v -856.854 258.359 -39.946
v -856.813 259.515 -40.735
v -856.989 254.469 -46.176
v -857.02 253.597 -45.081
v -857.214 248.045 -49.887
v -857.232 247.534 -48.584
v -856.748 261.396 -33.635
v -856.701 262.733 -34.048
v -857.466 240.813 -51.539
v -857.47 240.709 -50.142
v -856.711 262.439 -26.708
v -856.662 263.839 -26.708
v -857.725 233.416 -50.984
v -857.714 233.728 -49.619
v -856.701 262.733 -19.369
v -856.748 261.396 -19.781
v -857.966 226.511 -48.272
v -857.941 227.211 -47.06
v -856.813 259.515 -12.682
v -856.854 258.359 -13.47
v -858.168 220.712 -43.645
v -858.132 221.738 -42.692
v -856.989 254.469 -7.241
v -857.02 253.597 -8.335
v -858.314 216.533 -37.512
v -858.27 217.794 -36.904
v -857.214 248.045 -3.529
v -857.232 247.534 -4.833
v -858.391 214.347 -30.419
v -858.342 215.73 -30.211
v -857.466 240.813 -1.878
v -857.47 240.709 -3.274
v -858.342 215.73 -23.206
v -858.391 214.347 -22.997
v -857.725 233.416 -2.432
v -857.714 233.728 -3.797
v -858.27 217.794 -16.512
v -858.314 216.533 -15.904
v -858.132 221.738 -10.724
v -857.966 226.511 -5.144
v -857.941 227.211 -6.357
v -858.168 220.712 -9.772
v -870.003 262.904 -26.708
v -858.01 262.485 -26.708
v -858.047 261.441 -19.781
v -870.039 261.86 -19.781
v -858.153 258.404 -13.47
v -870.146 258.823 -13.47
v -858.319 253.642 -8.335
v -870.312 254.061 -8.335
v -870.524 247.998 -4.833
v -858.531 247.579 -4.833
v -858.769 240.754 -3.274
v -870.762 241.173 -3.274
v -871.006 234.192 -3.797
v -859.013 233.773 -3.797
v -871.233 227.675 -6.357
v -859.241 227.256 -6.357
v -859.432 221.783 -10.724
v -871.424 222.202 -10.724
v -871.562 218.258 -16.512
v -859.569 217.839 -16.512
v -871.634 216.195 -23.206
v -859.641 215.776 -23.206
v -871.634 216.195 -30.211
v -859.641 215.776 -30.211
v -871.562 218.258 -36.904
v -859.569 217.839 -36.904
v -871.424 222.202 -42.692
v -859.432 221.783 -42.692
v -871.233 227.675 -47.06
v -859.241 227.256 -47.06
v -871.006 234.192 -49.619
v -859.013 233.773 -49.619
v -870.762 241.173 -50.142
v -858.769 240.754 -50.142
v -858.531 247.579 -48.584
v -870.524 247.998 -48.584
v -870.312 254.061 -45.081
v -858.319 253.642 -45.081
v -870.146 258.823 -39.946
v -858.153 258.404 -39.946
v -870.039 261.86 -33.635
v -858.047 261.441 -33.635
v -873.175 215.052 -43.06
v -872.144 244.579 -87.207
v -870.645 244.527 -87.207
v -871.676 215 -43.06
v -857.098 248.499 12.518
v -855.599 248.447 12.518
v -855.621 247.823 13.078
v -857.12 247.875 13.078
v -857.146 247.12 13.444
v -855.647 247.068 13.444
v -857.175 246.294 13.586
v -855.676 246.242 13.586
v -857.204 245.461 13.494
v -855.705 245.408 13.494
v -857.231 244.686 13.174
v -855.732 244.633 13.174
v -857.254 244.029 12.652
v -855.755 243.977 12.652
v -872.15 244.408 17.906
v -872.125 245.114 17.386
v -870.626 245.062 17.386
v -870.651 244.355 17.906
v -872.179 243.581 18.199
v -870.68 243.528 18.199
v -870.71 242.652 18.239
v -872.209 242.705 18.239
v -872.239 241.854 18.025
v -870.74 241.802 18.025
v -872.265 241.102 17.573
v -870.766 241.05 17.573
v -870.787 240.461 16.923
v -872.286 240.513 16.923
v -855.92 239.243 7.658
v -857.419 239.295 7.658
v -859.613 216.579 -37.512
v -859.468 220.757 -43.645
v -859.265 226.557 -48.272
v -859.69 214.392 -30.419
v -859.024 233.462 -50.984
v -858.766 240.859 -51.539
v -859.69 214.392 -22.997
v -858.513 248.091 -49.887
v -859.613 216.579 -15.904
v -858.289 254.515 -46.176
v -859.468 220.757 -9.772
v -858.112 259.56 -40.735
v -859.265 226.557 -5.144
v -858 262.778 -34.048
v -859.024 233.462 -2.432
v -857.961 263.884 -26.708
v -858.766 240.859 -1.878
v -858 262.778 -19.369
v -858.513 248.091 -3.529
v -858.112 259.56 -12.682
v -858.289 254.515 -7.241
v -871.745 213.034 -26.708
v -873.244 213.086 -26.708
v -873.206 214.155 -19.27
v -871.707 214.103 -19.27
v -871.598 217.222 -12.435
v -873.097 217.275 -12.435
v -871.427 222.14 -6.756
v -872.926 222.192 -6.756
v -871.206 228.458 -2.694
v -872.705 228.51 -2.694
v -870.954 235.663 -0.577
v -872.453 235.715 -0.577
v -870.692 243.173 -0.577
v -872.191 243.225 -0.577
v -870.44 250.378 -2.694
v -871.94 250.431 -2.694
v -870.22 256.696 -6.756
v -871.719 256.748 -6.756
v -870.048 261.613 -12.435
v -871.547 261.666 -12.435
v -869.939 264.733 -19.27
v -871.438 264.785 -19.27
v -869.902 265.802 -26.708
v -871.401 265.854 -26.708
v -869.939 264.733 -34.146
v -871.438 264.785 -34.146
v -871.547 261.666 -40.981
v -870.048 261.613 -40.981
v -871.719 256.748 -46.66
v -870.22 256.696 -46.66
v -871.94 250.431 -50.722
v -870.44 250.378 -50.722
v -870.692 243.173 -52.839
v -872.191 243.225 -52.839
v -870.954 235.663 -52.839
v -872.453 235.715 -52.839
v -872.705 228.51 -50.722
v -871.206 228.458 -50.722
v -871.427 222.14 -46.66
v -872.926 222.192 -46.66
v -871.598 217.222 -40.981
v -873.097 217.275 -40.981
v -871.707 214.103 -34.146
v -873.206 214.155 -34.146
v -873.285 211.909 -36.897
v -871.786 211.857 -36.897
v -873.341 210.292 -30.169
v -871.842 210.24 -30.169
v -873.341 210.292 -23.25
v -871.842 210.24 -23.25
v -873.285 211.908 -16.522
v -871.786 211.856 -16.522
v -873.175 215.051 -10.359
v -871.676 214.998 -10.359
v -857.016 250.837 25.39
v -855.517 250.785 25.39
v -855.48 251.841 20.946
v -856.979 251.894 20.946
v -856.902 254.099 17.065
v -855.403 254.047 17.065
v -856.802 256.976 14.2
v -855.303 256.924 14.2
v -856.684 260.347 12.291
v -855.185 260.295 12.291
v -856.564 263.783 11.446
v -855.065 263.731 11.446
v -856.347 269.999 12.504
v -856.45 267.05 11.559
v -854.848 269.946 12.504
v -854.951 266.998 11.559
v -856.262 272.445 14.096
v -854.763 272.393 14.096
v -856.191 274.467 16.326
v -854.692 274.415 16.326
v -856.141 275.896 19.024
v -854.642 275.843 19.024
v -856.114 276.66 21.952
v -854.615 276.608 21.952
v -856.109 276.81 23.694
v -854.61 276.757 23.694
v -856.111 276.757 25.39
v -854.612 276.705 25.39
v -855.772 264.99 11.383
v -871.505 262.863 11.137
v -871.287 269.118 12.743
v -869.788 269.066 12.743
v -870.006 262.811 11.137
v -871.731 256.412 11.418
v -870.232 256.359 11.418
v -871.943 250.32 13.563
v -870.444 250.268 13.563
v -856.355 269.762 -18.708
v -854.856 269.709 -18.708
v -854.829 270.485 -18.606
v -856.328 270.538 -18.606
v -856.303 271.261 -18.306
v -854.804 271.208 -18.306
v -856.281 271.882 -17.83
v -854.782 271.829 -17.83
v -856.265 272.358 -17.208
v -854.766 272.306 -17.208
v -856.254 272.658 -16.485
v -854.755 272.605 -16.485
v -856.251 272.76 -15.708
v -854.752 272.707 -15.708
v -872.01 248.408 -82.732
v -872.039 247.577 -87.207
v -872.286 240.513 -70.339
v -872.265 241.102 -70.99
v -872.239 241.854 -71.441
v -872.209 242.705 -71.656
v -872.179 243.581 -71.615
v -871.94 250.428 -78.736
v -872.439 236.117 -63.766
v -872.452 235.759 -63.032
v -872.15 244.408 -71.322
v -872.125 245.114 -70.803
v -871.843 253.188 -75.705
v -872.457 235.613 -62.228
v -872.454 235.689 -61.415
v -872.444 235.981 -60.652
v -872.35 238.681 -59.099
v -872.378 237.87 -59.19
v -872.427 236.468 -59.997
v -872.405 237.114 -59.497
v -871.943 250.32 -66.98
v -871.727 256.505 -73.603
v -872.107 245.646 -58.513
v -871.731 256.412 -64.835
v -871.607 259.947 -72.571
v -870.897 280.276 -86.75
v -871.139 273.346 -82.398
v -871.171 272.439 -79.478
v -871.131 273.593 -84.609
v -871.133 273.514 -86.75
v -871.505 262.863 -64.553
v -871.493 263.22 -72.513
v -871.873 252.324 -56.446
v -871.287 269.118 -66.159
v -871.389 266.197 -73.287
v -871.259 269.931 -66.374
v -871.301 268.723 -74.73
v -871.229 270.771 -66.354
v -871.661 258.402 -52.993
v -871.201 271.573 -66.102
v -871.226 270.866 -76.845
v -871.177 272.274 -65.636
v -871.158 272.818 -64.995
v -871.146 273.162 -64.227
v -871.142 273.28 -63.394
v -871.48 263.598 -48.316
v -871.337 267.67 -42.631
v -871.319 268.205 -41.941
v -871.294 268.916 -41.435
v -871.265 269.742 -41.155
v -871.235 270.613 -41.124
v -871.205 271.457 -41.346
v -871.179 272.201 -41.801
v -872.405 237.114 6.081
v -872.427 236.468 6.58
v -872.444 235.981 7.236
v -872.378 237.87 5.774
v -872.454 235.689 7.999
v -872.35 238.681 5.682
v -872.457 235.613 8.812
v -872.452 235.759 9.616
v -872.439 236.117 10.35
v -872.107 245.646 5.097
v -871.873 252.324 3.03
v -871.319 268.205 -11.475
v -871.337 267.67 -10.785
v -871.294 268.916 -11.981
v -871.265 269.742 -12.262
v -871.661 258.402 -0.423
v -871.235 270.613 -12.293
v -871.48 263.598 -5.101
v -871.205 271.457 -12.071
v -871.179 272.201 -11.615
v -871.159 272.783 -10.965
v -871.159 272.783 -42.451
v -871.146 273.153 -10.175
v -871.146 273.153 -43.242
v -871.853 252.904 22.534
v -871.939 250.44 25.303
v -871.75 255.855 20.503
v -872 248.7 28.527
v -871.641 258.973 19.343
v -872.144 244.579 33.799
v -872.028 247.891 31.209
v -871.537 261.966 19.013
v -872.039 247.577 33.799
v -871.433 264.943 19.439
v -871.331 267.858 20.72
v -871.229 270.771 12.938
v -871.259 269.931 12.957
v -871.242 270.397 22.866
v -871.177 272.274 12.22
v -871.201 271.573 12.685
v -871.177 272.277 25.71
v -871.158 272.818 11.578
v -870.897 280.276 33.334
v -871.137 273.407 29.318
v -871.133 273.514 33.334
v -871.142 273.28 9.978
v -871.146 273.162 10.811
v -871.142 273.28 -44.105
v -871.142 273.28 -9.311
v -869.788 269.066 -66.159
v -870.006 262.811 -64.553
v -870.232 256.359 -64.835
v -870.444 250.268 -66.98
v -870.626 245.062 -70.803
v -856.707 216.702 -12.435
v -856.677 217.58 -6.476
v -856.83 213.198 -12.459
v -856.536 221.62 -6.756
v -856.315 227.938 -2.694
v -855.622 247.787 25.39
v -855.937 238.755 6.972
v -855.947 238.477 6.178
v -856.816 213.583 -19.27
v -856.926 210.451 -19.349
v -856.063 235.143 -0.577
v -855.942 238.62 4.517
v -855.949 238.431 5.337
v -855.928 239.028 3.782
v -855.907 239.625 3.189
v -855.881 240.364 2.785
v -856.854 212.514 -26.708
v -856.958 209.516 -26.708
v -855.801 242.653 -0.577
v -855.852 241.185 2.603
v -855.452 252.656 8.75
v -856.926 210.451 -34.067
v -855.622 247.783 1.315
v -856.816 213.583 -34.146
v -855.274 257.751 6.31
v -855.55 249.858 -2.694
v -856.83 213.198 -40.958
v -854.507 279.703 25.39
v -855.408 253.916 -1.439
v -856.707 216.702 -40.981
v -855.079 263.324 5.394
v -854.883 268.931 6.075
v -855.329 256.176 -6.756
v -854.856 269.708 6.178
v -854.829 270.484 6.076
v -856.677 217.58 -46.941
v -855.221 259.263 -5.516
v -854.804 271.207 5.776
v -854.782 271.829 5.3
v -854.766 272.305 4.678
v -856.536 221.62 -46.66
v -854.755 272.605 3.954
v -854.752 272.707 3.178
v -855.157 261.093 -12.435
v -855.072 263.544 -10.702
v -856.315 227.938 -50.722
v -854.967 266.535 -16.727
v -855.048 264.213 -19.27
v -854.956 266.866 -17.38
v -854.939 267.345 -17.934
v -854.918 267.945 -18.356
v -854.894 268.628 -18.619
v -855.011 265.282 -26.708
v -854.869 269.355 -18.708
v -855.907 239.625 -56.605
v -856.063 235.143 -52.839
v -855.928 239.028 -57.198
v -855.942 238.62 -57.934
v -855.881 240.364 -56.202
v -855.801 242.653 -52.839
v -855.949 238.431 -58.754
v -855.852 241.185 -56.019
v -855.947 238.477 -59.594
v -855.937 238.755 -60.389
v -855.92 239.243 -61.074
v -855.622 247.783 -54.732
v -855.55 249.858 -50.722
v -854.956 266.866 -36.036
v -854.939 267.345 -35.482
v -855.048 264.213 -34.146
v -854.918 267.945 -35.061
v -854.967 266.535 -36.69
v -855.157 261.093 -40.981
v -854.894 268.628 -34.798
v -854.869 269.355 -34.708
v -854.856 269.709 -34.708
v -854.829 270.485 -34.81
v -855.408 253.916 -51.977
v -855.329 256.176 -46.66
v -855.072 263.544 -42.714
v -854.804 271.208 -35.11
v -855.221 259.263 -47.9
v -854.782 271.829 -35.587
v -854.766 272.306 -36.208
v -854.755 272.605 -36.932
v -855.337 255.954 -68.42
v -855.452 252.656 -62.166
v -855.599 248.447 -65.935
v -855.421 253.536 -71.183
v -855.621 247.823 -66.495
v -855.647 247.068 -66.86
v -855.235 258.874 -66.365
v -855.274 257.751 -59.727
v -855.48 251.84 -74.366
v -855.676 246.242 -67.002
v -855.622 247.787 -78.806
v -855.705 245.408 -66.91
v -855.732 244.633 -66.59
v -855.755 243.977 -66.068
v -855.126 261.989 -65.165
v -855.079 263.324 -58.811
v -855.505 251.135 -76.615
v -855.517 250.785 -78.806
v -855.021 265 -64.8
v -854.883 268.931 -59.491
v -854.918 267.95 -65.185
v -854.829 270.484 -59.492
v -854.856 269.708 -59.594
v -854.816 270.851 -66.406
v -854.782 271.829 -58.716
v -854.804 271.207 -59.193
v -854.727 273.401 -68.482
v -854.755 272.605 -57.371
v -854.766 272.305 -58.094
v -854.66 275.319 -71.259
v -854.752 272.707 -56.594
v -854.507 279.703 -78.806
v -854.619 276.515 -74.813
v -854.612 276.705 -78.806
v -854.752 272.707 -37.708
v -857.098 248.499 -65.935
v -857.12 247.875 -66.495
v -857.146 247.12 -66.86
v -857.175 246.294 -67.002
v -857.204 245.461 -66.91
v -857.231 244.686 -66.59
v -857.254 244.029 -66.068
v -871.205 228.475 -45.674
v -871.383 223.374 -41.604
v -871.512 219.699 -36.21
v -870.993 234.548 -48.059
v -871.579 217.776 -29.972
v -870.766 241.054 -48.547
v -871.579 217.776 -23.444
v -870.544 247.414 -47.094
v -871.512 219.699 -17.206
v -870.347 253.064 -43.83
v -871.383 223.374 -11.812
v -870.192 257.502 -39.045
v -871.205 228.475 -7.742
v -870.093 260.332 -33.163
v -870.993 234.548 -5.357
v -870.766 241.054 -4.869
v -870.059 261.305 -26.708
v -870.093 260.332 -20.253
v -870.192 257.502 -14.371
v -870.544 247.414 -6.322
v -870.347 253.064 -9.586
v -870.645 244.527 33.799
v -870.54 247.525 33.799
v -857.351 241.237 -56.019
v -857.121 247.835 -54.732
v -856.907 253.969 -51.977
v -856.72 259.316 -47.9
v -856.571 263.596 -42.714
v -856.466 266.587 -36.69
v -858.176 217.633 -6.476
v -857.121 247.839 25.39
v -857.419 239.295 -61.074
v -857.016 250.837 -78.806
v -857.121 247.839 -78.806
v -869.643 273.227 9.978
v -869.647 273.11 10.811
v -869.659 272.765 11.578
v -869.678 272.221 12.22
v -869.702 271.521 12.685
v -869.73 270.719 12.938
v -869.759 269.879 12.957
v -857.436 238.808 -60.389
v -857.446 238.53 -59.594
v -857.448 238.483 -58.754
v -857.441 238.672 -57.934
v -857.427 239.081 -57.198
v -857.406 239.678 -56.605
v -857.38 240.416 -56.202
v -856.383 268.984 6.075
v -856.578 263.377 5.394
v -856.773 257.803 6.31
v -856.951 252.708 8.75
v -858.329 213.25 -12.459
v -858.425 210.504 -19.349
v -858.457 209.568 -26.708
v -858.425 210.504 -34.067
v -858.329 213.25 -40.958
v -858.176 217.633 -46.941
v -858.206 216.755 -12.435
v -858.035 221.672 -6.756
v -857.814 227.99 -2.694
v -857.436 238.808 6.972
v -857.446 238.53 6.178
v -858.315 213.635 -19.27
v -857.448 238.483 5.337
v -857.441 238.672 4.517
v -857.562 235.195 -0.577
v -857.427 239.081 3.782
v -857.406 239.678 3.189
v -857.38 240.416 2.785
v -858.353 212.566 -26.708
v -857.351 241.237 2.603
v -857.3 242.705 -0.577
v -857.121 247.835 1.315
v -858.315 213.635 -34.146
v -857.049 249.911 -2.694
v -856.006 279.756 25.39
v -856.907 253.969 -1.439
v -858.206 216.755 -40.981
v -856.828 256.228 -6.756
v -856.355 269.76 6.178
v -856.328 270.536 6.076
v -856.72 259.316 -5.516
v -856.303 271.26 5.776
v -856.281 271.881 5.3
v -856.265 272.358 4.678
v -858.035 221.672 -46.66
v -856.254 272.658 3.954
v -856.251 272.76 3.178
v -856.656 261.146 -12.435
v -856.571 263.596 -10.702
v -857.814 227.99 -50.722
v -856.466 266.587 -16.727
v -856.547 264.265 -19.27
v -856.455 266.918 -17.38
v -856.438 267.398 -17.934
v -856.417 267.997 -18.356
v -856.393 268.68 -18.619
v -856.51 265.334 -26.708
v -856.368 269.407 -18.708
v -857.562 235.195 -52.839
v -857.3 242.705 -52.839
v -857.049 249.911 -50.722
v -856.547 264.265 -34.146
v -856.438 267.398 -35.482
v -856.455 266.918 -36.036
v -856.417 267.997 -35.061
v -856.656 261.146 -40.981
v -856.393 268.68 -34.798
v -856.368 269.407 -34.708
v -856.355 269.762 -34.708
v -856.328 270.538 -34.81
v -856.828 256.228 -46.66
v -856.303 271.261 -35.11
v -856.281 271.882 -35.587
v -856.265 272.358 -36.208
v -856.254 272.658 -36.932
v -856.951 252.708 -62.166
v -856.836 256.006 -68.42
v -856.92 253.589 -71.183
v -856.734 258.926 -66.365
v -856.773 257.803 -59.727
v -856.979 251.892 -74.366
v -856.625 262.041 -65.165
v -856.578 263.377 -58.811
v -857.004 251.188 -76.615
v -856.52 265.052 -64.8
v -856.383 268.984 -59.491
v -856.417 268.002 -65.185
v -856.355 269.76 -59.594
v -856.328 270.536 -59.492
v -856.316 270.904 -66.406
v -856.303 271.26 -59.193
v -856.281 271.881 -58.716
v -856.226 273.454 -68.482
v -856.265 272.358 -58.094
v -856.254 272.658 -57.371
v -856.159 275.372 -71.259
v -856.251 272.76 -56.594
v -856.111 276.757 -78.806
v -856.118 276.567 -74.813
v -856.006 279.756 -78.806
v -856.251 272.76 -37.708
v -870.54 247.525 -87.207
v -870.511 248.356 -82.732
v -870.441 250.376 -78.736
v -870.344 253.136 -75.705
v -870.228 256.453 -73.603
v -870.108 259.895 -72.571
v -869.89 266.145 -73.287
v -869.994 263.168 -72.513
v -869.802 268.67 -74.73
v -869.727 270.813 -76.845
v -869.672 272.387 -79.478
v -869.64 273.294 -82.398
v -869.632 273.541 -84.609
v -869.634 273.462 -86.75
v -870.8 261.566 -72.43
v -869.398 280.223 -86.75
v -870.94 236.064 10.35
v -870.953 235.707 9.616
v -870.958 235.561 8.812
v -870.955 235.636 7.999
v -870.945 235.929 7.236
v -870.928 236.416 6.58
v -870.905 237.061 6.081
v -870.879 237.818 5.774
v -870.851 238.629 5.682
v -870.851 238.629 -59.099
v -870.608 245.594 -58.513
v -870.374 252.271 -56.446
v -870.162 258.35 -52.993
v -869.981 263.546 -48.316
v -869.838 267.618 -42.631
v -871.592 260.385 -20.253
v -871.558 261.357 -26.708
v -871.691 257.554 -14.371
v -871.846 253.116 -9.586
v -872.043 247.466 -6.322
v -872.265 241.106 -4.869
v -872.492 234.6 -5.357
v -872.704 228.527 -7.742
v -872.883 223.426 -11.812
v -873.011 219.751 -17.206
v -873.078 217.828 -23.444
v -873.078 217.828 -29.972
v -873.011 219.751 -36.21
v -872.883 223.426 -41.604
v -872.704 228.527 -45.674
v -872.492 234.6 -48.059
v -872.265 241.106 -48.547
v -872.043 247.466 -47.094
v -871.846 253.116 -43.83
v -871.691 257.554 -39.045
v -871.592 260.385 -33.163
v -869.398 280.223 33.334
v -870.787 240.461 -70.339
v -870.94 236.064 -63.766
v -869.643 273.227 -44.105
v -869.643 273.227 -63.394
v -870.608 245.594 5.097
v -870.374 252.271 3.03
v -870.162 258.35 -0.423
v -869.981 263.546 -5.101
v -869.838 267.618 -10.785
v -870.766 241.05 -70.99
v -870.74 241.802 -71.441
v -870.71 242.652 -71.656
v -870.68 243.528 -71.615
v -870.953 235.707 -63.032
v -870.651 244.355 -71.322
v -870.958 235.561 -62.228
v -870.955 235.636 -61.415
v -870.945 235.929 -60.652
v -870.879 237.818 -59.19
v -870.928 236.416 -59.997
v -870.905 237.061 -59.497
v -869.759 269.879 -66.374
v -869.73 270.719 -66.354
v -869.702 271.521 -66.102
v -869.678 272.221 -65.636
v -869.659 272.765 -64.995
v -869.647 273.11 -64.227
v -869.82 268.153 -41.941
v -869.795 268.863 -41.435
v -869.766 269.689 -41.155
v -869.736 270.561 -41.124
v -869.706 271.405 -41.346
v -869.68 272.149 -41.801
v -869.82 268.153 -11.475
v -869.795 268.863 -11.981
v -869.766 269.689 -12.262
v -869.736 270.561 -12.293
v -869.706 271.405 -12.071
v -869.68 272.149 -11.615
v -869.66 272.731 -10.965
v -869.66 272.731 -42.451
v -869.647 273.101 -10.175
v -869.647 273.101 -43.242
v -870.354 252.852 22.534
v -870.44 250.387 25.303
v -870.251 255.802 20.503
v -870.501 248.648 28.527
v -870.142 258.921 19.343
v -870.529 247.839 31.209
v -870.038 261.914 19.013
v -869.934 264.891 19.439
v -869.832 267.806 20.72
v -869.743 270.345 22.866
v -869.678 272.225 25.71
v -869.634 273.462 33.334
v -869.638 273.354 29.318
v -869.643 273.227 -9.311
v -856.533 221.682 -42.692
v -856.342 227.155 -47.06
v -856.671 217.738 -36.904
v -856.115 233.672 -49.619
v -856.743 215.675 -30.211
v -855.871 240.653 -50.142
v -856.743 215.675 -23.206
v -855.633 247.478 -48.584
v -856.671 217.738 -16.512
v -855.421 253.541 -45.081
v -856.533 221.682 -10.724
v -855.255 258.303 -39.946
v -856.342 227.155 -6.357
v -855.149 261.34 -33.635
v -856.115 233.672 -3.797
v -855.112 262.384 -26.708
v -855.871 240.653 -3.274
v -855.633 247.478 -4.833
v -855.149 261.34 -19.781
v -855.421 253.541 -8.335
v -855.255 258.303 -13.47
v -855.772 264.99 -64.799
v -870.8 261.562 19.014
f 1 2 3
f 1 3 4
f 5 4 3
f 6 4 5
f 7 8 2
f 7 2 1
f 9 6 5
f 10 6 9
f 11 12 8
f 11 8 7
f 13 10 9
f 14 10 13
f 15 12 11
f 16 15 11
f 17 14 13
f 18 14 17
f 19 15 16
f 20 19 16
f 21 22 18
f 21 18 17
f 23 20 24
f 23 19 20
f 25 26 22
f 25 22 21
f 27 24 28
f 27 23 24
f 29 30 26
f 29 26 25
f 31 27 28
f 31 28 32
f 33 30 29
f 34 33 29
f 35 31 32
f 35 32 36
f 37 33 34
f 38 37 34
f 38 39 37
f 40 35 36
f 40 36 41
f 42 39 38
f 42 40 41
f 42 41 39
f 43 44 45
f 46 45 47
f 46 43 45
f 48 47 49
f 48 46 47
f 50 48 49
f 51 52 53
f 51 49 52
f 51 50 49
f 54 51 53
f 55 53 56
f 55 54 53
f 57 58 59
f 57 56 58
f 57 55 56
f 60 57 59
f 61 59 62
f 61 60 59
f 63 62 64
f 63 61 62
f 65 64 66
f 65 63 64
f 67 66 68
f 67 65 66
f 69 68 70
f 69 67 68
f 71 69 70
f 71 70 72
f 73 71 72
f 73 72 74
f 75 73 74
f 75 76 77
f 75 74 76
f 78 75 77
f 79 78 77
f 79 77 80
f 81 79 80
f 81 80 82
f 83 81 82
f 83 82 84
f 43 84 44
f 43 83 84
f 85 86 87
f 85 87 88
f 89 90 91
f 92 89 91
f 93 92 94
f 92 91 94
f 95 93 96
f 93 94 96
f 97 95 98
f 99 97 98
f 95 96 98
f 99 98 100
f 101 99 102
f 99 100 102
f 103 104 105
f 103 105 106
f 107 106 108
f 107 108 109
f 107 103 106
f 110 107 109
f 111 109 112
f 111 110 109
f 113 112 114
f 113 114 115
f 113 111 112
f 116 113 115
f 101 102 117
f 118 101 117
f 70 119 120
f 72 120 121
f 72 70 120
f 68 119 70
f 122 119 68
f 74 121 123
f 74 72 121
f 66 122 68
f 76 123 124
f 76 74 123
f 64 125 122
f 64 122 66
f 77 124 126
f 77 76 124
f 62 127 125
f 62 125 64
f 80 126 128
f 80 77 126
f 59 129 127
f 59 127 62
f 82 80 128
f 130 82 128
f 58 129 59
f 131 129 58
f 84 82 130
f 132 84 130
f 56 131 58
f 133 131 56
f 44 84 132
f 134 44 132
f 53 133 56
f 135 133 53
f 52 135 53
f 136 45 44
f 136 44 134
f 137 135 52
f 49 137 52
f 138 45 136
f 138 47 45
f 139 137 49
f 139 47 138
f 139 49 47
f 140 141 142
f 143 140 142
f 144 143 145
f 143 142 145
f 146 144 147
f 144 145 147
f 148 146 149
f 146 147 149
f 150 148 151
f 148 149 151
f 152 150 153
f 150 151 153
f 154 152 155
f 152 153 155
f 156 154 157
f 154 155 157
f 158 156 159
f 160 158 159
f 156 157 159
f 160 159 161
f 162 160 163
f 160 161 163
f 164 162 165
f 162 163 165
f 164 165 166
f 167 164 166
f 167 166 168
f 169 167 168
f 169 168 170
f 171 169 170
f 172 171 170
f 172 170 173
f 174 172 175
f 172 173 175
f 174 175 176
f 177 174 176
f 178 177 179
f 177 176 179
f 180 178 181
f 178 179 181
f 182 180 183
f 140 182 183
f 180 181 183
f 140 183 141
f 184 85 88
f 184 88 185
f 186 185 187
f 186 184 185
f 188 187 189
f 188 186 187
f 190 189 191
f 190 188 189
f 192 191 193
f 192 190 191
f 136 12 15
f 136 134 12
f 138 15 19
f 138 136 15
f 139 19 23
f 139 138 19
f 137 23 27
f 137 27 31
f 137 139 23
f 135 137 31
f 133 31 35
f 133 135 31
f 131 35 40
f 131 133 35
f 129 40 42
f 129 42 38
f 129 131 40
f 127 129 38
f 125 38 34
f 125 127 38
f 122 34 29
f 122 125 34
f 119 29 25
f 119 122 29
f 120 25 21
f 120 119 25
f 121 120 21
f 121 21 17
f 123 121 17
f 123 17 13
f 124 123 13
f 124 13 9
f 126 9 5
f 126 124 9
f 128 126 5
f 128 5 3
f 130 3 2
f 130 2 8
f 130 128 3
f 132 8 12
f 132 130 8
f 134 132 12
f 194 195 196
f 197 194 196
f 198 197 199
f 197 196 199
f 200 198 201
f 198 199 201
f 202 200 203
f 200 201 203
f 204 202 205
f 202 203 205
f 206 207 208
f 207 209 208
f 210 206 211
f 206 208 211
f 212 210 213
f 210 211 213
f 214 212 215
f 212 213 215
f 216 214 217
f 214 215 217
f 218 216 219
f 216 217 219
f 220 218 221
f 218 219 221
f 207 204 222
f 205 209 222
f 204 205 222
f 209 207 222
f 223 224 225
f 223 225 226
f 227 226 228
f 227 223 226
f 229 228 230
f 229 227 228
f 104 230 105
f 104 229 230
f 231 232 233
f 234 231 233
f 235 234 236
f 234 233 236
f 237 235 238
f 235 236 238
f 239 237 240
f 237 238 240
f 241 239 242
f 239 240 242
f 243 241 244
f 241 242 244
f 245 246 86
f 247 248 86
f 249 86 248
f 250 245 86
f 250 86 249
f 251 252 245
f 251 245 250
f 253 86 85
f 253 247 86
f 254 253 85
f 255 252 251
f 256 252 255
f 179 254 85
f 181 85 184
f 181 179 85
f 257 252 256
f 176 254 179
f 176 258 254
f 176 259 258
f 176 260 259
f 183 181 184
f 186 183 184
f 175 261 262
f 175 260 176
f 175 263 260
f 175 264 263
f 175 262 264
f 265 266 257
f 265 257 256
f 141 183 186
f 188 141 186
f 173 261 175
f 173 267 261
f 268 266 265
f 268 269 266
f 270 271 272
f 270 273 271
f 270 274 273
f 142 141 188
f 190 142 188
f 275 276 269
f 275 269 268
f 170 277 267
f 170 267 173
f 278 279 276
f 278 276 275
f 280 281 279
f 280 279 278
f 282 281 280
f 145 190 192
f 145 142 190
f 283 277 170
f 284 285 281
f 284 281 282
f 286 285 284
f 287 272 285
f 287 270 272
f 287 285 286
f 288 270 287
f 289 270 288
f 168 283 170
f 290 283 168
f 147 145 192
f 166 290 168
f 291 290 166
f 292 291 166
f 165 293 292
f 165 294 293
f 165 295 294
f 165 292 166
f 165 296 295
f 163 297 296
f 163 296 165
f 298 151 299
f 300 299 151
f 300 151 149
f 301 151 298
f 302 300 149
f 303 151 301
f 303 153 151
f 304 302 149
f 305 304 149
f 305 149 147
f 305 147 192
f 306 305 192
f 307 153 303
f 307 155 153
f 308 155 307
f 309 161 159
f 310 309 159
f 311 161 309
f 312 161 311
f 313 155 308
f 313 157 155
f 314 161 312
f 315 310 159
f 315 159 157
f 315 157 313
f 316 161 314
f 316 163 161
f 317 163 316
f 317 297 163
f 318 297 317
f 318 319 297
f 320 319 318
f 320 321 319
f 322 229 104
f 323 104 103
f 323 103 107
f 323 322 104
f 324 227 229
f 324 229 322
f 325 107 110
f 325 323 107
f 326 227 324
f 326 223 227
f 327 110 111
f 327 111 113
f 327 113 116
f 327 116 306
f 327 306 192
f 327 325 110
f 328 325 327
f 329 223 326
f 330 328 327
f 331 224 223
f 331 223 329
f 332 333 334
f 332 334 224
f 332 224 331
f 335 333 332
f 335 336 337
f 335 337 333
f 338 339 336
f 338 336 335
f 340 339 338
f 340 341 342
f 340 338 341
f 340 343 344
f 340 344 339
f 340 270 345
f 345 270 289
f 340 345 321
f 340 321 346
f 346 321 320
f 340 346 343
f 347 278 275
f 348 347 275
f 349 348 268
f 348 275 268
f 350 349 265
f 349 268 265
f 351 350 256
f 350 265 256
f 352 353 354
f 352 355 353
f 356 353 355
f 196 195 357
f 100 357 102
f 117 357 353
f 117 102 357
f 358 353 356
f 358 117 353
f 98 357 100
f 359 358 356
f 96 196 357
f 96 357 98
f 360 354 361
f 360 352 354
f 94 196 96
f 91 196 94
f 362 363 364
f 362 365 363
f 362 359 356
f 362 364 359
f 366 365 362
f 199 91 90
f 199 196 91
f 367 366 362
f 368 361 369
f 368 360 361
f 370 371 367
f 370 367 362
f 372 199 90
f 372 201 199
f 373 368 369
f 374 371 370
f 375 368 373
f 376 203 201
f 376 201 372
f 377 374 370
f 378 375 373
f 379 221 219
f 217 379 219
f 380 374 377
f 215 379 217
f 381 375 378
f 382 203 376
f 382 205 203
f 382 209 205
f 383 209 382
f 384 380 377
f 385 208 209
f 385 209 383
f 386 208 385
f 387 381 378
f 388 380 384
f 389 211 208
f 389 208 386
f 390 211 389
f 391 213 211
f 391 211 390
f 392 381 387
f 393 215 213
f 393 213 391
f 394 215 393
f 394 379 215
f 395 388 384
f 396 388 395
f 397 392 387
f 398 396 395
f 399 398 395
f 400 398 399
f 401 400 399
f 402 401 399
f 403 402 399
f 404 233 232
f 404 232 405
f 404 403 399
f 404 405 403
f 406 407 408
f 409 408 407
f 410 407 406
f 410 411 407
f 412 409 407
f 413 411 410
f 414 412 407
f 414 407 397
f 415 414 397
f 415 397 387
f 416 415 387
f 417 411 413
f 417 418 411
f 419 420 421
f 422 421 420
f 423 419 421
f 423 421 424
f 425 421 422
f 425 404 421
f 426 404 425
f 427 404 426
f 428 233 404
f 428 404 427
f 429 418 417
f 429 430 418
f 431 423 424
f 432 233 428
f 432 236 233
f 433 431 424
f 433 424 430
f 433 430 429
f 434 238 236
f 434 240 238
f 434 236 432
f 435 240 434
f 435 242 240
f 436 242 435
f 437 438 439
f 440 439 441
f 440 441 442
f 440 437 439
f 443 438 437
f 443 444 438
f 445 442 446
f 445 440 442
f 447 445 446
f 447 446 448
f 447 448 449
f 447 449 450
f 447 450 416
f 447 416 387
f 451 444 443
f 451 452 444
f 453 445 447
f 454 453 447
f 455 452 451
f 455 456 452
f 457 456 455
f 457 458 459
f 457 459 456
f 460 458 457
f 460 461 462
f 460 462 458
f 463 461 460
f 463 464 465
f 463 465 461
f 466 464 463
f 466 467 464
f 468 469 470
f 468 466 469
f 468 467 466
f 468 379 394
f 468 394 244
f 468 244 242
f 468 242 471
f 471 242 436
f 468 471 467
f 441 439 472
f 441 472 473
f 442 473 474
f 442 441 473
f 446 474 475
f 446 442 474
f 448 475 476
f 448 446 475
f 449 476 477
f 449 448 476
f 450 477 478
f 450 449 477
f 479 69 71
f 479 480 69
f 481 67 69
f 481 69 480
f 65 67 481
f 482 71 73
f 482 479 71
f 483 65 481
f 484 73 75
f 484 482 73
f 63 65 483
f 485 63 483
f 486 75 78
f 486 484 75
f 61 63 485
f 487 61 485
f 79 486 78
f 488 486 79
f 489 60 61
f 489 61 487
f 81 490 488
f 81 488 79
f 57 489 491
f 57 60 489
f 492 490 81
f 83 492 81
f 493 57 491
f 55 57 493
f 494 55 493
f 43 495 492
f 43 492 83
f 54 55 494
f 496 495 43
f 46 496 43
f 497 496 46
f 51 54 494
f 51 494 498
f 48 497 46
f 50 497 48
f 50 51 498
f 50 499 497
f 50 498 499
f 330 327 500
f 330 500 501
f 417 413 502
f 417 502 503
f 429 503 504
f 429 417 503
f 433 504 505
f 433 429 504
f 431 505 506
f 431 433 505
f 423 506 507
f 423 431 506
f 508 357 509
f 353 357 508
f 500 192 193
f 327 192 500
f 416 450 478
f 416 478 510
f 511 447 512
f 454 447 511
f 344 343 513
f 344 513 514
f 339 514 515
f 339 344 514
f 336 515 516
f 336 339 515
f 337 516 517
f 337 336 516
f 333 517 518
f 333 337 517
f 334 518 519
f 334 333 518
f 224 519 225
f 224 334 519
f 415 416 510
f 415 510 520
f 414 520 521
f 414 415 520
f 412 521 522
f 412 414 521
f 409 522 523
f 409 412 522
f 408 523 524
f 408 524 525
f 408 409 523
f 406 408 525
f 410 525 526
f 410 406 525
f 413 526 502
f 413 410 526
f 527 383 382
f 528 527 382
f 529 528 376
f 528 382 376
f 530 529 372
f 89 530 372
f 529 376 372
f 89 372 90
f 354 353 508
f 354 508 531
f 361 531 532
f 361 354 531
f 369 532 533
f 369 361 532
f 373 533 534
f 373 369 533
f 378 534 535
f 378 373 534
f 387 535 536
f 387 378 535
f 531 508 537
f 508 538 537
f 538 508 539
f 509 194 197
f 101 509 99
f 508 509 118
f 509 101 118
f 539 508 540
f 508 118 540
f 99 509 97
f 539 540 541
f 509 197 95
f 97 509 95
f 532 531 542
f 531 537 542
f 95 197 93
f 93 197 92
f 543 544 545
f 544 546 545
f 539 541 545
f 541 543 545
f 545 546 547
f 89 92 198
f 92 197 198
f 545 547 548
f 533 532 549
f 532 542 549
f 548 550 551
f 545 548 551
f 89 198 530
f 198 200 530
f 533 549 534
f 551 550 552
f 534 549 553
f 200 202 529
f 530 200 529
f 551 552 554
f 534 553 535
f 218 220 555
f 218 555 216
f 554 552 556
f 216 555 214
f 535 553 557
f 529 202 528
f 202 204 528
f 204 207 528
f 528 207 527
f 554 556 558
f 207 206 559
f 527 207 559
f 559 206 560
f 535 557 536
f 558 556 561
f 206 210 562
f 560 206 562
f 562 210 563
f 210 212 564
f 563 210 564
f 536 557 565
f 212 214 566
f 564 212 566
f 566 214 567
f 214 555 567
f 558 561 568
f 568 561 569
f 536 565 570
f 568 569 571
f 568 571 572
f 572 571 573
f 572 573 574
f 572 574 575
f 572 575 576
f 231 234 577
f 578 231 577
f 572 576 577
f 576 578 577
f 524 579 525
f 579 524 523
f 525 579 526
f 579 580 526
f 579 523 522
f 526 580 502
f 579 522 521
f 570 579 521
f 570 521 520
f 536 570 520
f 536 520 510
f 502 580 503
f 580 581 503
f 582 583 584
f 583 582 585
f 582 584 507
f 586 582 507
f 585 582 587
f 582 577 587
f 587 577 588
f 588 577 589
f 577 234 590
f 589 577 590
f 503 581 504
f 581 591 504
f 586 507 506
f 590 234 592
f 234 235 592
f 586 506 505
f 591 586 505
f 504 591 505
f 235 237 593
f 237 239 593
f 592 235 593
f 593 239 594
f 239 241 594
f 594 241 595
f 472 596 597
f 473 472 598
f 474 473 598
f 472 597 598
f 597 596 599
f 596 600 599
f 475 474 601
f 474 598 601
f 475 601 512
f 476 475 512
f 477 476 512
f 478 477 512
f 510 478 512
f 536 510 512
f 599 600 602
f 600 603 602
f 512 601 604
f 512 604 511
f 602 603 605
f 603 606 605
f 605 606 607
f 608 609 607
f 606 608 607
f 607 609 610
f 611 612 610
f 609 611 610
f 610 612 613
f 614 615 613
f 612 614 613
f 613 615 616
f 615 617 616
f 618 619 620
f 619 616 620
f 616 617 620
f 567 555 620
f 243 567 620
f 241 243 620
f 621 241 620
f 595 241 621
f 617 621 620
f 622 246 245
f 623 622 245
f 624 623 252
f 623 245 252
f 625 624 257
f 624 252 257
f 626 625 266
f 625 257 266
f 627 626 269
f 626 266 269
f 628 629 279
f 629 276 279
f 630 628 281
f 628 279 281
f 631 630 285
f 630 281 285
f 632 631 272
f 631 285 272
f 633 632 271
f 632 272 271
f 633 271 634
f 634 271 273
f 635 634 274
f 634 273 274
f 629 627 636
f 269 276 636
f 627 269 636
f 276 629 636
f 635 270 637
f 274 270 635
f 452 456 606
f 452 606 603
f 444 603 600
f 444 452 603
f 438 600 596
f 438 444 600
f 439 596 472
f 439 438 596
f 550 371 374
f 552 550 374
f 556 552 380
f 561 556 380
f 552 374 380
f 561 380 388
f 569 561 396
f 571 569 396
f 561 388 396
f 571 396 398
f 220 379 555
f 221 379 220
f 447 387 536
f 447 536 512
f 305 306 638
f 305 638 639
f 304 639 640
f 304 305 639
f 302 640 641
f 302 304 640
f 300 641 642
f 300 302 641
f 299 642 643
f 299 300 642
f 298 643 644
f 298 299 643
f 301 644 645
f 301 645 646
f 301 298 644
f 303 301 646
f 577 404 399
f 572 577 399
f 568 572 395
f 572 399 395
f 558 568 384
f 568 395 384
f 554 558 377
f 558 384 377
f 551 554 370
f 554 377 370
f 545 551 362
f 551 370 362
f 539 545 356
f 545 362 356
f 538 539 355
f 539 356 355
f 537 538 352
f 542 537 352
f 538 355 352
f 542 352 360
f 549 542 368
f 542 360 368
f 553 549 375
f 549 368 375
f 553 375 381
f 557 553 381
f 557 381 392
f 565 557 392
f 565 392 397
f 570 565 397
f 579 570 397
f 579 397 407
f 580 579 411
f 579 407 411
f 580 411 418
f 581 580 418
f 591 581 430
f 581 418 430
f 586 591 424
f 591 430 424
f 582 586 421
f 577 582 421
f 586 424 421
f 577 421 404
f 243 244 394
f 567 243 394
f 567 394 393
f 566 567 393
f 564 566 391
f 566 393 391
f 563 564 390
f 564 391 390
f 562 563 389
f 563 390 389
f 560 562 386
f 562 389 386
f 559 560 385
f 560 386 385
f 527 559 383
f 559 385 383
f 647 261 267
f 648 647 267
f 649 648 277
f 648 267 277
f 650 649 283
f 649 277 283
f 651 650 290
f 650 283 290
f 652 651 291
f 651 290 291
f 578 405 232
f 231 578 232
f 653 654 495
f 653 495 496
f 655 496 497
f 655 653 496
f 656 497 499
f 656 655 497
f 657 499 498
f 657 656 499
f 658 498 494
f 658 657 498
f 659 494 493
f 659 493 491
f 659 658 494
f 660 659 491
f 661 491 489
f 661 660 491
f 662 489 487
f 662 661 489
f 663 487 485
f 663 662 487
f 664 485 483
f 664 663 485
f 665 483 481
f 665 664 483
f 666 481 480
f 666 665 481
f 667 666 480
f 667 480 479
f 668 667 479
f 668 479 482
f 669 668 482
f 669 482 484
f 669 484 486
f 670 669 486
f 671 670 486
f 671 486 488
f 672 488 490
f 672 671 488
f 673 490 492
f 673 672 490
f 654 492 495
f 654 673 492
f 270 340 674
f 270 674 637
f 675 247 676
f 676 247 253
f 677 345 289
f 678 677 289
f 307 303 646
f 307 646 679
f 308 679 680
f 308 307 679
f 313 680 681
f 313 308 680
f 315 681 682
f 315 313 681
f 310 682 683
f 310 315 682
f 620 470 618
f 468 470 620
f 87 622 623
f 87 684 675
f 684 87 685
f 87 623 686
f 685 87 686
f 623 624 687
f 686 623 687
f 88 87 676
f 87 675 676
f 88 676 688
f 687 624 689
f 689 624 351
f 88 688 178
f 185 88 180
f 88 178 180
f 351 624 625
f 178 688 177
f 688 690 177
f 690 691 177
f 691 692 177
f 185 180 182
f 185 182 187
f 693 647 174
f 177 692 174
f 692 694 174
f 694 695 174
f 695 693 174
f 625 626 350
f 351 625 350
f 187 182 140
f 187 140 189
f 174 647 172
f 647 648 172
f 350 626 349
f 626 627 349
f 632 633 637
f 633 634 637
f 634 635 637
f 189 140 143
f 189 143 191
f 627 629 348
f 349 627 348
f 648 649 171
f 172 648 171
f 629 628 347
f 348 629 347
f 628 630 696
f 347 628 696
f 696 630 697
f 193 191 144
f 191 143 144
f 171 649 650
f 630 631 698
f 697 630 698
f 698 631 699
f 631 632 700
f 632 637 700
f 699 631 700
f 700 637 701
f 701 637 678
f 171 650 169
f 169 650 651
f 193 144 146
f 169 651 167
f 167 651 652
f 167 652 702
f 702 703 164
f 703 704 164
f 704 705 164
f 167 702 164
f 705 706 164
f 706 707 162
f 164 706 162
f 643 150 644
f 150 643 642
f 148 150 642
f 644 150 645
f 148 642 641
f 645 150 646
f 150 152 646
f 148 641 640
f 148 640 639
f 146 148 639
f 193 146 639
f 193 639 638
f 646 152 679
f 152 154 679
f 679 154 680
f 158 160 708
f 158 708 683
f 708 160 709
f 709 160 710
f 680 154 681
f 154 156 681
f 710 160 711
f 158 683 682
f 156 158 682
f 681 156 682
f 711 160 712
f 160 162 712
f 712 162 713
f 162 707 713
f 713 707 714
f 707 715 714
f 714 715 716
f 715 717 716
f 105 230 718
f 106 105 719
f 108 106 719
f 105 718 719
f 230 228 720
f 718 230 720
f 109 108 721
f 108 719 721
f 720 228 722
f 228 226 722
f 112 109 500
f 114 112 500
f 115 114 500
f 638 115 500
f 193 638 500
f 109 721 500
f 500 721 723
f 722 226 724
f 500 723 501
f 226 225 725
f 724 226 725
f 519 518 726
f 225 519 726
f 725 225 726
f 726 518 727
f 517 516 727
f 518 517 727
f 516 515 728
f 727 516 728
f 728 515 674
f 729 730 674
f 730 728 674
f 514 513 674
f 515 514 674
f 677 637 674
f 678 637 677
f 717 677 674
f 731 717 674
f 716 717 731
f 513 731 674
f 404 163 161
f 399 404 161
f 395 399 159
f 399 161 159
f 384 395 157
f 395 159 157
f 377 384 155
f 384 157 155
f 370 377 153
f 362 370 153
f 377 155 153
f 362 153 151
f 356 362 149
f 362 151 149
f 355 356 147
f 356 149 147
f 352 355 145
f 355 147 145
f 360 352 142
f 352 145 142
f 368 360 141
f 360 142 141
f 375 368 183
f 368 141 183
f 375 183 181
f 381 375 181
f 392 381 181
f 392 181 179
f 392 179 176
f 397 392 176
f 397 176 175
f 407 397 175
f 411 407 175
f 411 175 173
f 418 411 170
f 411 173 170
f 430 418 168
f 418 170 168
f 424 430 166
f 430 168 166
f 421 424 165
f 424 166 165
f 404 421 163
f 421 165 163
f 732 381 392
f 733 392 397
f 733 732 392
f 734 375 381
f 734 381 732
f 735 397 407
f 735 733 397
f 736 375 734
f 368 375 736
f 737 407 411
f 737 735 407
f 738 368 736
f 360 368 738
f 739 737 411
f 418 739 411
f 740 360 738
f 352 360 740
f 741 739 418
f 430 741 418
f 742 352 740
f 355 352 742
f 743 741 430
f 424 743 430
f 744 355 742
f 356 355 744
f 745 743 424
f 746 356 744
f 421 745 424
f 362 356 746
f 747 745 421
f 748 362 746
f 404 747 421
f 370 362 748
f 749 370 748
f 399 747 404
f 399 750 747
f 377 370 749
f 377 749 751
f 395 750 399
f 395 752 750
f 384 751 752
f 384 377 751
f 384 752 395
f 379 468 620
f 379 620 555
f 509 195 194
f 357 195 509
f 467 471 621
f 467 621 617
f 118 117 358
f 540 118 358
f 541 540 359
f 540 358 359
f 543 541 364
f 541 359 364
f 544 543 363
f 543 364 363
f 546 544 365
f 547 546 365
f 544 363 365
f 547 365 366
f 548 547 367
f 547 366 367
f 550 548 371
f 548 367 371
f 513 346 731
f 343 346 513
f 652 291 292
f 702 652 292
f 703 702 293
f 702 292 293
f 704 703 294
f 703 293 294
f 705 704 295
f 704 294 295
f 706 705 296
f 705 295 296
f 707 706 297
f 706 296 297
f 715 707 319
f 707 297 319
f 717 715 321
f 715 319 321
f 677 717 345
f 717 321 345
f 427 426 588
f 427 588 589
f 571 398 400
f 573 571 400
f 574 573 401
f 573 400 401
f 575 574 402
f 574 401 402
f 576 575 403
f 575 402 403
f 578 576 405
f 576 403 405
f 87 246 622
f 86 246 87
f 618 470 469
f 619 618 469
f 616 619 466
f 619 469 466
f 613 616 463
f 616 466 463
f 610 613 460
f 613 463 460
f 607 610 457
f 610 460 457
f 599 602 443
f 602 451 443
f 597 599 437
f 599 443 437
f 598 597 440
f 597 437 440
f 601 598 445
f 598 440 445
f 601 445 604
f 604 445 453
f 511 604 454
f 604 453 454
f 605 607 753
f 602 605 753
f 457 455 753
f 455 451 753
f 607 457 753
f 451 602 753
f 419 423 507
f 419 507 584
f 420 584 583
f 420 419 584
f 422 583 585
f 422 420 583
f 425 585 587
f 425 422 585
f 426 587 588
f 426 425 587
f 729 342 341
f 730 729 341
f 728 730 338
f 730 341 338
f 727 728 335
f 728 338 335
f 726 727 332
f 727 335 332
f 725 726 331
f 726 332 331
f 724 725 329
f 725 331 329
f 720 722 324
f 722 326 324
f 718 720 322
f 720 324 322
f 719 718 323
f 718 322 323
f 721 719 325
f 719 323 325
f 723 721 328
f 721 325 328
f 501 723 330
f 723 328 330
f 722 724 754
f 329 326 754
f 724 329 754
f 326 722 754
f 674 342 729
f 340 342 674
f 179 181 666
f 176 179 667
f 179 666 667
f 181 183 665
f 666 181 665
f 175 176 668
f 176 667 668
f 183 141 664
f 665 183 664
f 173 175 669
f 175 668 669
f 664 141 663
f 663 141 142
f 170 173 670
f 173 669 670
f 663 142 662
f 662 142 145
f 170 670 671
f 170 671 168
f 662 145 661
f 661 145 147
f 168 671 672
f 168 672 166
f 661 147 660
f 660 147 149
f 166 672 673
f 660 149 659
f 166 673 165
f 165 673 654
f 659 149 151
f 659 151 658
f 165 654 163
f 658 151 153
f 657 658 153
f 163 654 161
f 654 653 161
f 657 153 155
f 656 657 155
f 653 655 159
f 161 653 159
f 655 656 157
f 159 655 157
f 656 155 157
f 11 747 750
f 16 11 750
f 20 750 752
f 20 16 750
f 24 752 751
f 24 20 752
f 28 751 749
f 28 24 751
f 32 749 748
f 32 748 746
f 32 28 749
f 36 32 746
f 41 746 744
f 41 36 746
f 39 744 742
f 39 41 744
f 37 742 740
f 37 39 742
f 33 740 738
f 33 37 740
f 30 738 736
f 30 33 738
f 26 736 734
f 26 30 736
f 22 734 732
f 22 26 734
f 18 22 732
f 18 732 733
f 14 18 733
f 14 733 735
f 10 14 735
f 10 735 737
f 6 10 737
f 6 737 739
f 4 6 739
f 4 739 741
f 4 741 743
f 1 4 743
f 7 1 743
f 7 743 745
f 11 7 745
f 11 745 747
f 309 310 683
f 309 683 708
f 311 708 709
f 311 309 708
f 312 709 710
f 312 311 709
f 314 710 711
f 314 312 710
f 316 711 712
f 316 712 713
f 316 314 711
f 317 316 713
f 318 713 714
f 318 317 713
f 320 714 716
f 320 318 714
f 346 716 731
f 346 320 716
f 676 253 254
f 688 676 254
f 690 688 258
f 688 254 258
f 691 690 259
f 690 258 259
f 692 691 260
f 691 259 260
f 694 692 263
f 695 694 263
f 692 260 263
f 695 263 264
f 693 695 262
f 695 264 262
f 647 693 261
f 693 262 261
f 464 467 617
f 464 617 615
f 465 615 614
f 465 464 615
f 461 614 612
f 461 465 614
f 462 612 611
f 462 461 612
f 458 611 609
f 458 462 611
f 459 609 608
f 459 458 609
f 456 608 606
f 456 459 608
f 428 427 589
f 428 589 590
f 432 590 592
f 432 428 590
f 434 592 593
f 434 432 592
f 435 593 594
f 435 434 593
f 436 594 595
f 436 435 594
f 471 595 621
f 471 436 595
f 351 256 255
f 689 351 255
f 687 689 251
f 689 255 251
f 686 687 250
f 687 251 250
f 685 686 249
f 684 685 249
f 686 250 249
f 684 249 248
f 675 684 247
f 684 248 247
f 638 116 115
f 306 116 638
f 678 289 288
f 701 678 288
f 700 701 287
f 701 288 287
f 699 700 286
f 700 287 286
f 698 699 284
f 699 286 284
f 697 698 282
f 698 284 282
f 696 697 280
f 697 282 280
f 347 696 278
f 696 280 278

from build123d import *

# Parameters (mm, degrees)
SKETCH1_R                           = 12.7
SKETCH1_R_2                         = 10.668
STRUCTURAL_MEMBERLEFTDIAGTUBE_DEPTH = 435.613716129
EXTRUDEBEARINGCUP_START             = -8.2
SKETCH12_R                          = 26.4
SKETCH12_R_2                        = 23.5
EXTRUDEBEARINGCUP_DEPTH             = 16.4
SKETCH15_R                          = 23.5
SKETCH15_R_2                        = 21.9
BEARING_BACKSTOP_DEPTH              = 1.5
SKETCH24_R                          = 26.4
BOSS_EXTRUDEREARFLANGE_DEPTH        = 1.5
SKETCH16_R                          = 26.4
BOSS_EXTRUDEFRONTFLANGE_DEPTH       = 1.5
SKETCH20_R                          = 12.7
CUT_EXTRUDE1_DEPTH                  = 834.807291922
SKETCH26_R                          = 12.7
CUT_EXTRUDE2_DEPTH                  = 706.049293577


with BuildPart() as part:
    # Sketch1 → Structural MemberLeftDiagTube (new body)
    with BuildSketch(Plane(origin=(-742.278957466, 285.318954728, -26.691255907), x_dir=(0.4337677346733861, -0.1083105522192937, 0.894491127197062), z_dir=(-0.8944911271970621, -0.17110086067965116, 0.41304977767868617))):
        Circle(SKETCH1_R)
        Circle(SKETCH1_R_2, mode=Mode.SUBTRACT)
    extrude(amount=STRUCTURAL_MEMBERLEFTDIAGTUBE_DEPTH)


with BuildPart() as body_2:
    # MirrorRightDiagTube: mirrored copy
    add(part.part.mirror(Plane.XY.offset(-26.708200568)))


with BuildPart() as body_3:
    # Sketch12 → ExtrudeBearingCup (new body)
    with BuildSketch(Plane(origin=(-871.417099955, 30.430555679, 0), x_dir=(0, 0, -1), z_dir=(0.9993908270190963, -0.03489949670248751, 0)).offset(EXTRUDEBEARINGCUP_START)):
        with Locations(Location((26.708200568, 208.880792495, 0), (0, 0, 90))):
            Circle(SKETCH12_R)
        with Locations(Location((26.708200568, 208.880792495, 0), (0, 0, 90))):
            Circle(SKETCH12_R_2, mode=Mode.SUBTRACT)
    extrude(amount=EXTRUDEBEARINGCUP_DEPTH)

    # Sketch15 → Bearing Backstop (add)
    with BuildSketch(Plane(origin=(-879.612104737, 30.716731552, 0), x_dir=(0, 0, -1), z_dir=(0.9993908270190963, -0.034899496702487515, 0))):
        with Locations(Location((26.708200568, 208.880792495, 0), (0, 0, 90))):
            Circle(SKETCH15_R)
        with Locations(Location((26.708200568, 208.880792495, 0), (0, 0, 90))):
            Circle(SKETCH15_R_2, mode=Mode.SUBTRACT)
    extrude(amount=BEARING_BACKSTOP_DEPTH)

    # Sketch23 → Cut-RevolveSnapRingGroove (revolve, cut)
    with BuildSketch(Plane.XY.offset(-26.708200568), mode=Mode.PRIVATE) as cut_revolvesnapringgroove_sk:
        Polygon((-857.531285968, 238.953766961), (-858.400283436, 214.068935368), (-859.699491511, 214.114304714), (-858.830494043, 238.999136306), align=None)
    revolve(cut_revolvesnapringgroove_sk.sketch.rotate(Axis((-880.000118881, 239.738395896, -26.708200568), (0.9993908270190962, -0.03489949670248762, 0)), 180), axis=Axis((-880.000118881, 239.738395896, -26.708200568), (0.9993908270190962, -0.03489949670248762, 0)), mode=Mode.SUBTRACT)


with BuildPart() as body_4:
    # Sketch24 → Boss-ExtrudeRearFlange (new body)
    with BuildSketch(Plane(origin=(-863.222095173, 30.144379806, 0), x_dir=(0, 0, -1), z_dir=(0.9993908270190963, -0.034899496702487515, 0))):
        with BuildLine():
            Line((78.806239974, 246.71090197), (78.806239974, 249.71090197))
            Line((78.806239974, 249.71090197), (-25.389838838, 249.71090197))
            Line((-25.389838838, 249.71090197), (-25.389838838, 246.71090197))
            add(Edge.make_bspline(
                [(-25.389838838, 220.775104066), (-11.383096571, 221.994886497), (-11.383096571, 234.962785449), (-11.383096571, 247.930684401), (-25.389838838, 246.71090197)],
                knots=[1.160721876, 1.160721876, 1.160721876, 2.731518203, 2.731518203, 4.302314529, 4.302314529, 4.302314529], degree=2, weights=[1, 0.707106781, 1, 0.707106781, 1]))
            Line((-25.389838838, 220.775104066), (-25.389838838, 217.775104066))
            Line((-25.389838838, 217.775104066), (6.475538565, 187.550077826))
            ThreePointArc((6.475538565, 187.550077826), (26.708200568, 179.480792495), (46.94086257, 187.550077826))
            Line((46.94086257, 187.550077826), (78.806239974, 217.775104066))
            Line((78.806239974, 217.775104066), (78.806239974, 220.775104066))
            add(Edge.make_bspline(
                [(78.806239974, 246.71090197), (64.799497707, 247.930684401), (64.799497707, 234.962785449), (64.799497707, 221.994886497), (78.806239974, 220.775104066)],
                knots=[5.122463431, 5.122463431, 5.122463431, 6.693259758, 6.693259758, 8.264056085, 8.264056085, 8.264056085], degree=2, weights=[1, 0.707106781, 1, 0.707106781, 1]))
        make_face()
        with Locations(Location((26.708200568, 208.880792495, 0), (0, 0, 90))):
            Circle(SKETCH24_R, mode=Mode.SUBTRACT)
        with BuildLine():
            Line((-12.651994558, 213.962737757), (-7.658075134, 209.225893008))
            ThreePointArc((-7.658075134, 209.225893008), (-4.517205064, 208.602219609), (-2.602617939, 211.16900543))
            ThreePointArc((-2.602617939, 211.16900543), (3.323935367, 226.700336289), (16.726719086, 236.534544997))
            ThreePointArc((16.726719086, 236.534544997), (18.163353878, 237.632343071), (18.708200568, 239.356356477))
            Line((18.708200568, 239.356356477), (18.708200568, 239.71090197))
            ThreePointArc((18.708200568, 239.71090197), (17.829520911, 241.832222313), (15.708200568, 242.71090197))
            Line((15.708200568, 242.71090197), (-3.177585866, 242.71090197))
            ThreePointArc((-3.177585866, 242.71090197), (-5.558264845, 241.536379331), (-6.074836253, 238.932480367))
            ThreePointArc((-6.074836253, 238.932480367), (-6.310345755, 227.745258132), (-12.518185249, 218.435471084))
            ThreePointArc((-12.518185249, 218.435471084), (-13.5860956, 216.229051182), (-12.651994558, 213.962737757))
        make_face(mode=Mode.SUBTRACT)
        with BuildLine():
            Line((66.068395694, 213.962737757), (61.07447627, 209.225893008))
            ThreePointArc((61.07447627, 209.225893008), (57.9336062, 208.602219609), (56.019019075, 211.16900543))
            ThreePointArc((56.019019075, 211.16900543), (50.092465769, 226.700336289), (36.689682049, 236.534544997))
            ThreePointArc((36.689682049, 236.534544997), (35.253047257, 237.632343071), (34.708200568, 239.356356477))
            Line((34.708200568, 239.356356477), (34.708200568, 239.71090197))
            ThreePointArc((34.708200568, 239.71090197), (35.586880224, 241.832222313), (37.708200568, 242.71090197))
            Line((37.708200568, 242.71090197), (56.593987002, 242.71090197))
            ThreePointArc((56.593987002, 242.71090197), (58.974665981, 241.536379331), (59.491237389, 238.932480367))
            ThreePointArc((59.491237389, 238.932480367), (59.726746891, 227.745258132), (65.934586385, 218.435471084))
            ThreePointArc((65.934586385, 218.435471084), (67.002496736, 216.229051182), (66.068395694, 213.962737757))
        make_face(mode=Mode.SUBTRACT)
    extrude(amount=-BOSS_EXTRUDEREARFLANGE_DEPTH)


with BuildPart() as body_5:
    # Sketch16 → Boss-ExtrudeFrontFlange (new body)
    with BuildSketch(Plane(origin=(-879.612104737, 30.716731552, 0), x_dir=(0, 0, 1), z_dir=(-0.9993908270190963, 0.034899496702487515, 0))):
        with BuildLine():
            Line((33.333947306, 249.71090197), (-86.750348442, 249.71090197))
            Line((-86.750348442, 249.71090197), (-86.750348442, 242.945449778))
            add(Edge.make_bspline(
                [(-87.206665991, 216.992905829), (-72.667344737, 217.516199157), (-72.429971378, 231.01654018), (-72.192598019, 244.516881203), (-86.750348442, 242.945449778)],
                knots=[4.247183605, 4.247183605, 4.247183605, 5.856808636, 5.856808636, 7.466433668, 7.466433668, 7.466433668], degree=2, weights=[1, 0.693246367, 1, 0.693246367, 1]))
            Line((-87.206665991, 216.992905829), (-87.206665991, 213.992905829))
            Line((-87.206665991, 213.992905829), (-43.060097657, 184.4477112))
            ThreePointArc((-43.060097657, 184.4477112), (-26.709608396, 179.480792529), (-10.358643524, 184.446145281))
            Line((-10.358643524, 184.446145281), (33.798949952, 213.992595743))
            Line((33.798949952, 213.992595743), (33.798949952, 216.992595743))
            add(Edge.make_bspline(
                [(33.333947306, 242.945449778), (18.771672419, 244.517369595), (19.013641816, 231.012507832), (19.255611213, 217.50764607), (33.798949952, 216.992595743)],
                knots=[5.099936946, 5.099936946, 5.099936946, 6.709872488, 6.709872488, 8.319808029, 8.319808029, 8.319808029], degree=2, weights=[1, 0.693134466, 1, 0.693134466, 1]))
            Line((33.333947306, 242.945449778), (33.333947306, 249.71090197))
        make_face()
        with Locations(Location((-26.708200568, 208.880792495, 0), (0, 0, 270))):
            Circle(SKETCH16_R, mode=Mode.SUBTRACT)
        with BuildLine():
            Line((-70.339444305, 209.924197834), (-63.766251621, 205.52507318))
            ThreePointArc((-63.766251621, 205.52507318), (-60.652345168, 205.389371158), (-59.098581361, 208.091342008))
            ThreePointArc((-59.098581361, 208.091342008), (-54.884301087, 224.876646944), (-42.631108459, 237.098180828))
            ThreePointArc((-42.631108459, 237.098180828), (-41.203886392, 240.473081927), (-44.105451782, 242.71090197))
            Line((-44.105451782, 242.71090197), (-63.394456936, 242.71090197))
            ThreePointArc((-63.394456936, 242.71090197), (-65.89374993, 241.370279722), (-66.159304398, 238.546591654))
            ThreePointArc((-66.159304398, 238.546591654), (-64.834781938, 225.832558144), (-70.802559667, 214.528282988))
            ThreePointArc((-70.802559667, 214.528282988), (-71.655820689, 212.117120751), (-70.339444305, 209.924197834))
        make_face(mode=Mode.SUBTRACT)
        with BuildLine():
            Line((16.923043169, 209.924197834), (10.349850485, 205.52507318))
            ThreePointArc((10.349850485, 205.52507318), (7.235944032, 205.389371158), (5.682180225, 208.091342008))
            ThreePointArc((5.682180225, 208.091342008), (1.467899951, 224.876646944), (-10.785292677, 237.098180828))
            ThreePointArc((-10.785292677, 237.098180828), (-12.212514744, 240.473081927), (-9.310949354, 242.71090197))
            Line((-9.310949354, 242.71090197), (9.9780558, 242.71090197))
            ThreePointArc((9.9780558, 242.71090197), (12.477348795, 241.370279722), (12.742903262, 238.546591654))
            ThreePointArc((12.742903262, 238.546591654), (11.418380802, 225.832558144), (17.386158531, 214.528282988))
            ThreePointArc((17.386158531, 214.528282988), (18.239419553, 212.117120751), (16.923043169, 209.924197834))
        make_face(mode=Mode.SUBTRACT)
    extrude(amount=-BOSS_EXTRUDEFRONTFLANGE_DEPTH)


with BuildPart() as cut_extrude1_tool:
    # Sketch20 → Cut-Extrude1 (new, through all)
    with BuildSketch(Plane(origin=(-928.95736894, -184.712015501, 428.965277628), x_dir=(0.40512847183893946, 0.08055133977062362, 0.9107043444316071), z_dir=(-0.8944911271970621, -0.1711008606796512, 0.41304977767868617))):
        with Locations((-301.478020707, 427.495628267)):
            Circle(SKETCH20_R)
    extrude(amount=-CUT_EXTRUDE1_DEPTH)


with BuildPart() as body_2_1:
    add(body_2.part)

    # Cut-Extrude1: cut by cut_extrude1_tool
    add(cut_extrude1_tool.part, mode=Mode.SUBTRACT)

    # Sketch26 → Cut-Extrude2 (cut, through all)
    with BuildSketch(Plane(origin=(-949.767238699, -181.674235826, -438.574665375), x_dir=(-0.4056944471820776, -0.07760241211483396, 0.9107084501417498), z_dir=(-0.8944911271970621, -0.1711008606796512, -0.41304977767868617))):
        with Locations((254.658196603, 419.695064707)):
            Circle(SKETCH26_R)
    extrude(amount=-CUT_EXTRUDE2_DEPTH, mode=Mode.SUBTRACT)


with BuildPart() as part_1:
    add(part.part)

    # Cut-Extrude1: cut by cut_extrude1_tool
    add(cut_extrude1_tool.part, mode=Mode.SUBTRACT)


solid = Compound([body_3.part, body_4.part, body_5.part])
